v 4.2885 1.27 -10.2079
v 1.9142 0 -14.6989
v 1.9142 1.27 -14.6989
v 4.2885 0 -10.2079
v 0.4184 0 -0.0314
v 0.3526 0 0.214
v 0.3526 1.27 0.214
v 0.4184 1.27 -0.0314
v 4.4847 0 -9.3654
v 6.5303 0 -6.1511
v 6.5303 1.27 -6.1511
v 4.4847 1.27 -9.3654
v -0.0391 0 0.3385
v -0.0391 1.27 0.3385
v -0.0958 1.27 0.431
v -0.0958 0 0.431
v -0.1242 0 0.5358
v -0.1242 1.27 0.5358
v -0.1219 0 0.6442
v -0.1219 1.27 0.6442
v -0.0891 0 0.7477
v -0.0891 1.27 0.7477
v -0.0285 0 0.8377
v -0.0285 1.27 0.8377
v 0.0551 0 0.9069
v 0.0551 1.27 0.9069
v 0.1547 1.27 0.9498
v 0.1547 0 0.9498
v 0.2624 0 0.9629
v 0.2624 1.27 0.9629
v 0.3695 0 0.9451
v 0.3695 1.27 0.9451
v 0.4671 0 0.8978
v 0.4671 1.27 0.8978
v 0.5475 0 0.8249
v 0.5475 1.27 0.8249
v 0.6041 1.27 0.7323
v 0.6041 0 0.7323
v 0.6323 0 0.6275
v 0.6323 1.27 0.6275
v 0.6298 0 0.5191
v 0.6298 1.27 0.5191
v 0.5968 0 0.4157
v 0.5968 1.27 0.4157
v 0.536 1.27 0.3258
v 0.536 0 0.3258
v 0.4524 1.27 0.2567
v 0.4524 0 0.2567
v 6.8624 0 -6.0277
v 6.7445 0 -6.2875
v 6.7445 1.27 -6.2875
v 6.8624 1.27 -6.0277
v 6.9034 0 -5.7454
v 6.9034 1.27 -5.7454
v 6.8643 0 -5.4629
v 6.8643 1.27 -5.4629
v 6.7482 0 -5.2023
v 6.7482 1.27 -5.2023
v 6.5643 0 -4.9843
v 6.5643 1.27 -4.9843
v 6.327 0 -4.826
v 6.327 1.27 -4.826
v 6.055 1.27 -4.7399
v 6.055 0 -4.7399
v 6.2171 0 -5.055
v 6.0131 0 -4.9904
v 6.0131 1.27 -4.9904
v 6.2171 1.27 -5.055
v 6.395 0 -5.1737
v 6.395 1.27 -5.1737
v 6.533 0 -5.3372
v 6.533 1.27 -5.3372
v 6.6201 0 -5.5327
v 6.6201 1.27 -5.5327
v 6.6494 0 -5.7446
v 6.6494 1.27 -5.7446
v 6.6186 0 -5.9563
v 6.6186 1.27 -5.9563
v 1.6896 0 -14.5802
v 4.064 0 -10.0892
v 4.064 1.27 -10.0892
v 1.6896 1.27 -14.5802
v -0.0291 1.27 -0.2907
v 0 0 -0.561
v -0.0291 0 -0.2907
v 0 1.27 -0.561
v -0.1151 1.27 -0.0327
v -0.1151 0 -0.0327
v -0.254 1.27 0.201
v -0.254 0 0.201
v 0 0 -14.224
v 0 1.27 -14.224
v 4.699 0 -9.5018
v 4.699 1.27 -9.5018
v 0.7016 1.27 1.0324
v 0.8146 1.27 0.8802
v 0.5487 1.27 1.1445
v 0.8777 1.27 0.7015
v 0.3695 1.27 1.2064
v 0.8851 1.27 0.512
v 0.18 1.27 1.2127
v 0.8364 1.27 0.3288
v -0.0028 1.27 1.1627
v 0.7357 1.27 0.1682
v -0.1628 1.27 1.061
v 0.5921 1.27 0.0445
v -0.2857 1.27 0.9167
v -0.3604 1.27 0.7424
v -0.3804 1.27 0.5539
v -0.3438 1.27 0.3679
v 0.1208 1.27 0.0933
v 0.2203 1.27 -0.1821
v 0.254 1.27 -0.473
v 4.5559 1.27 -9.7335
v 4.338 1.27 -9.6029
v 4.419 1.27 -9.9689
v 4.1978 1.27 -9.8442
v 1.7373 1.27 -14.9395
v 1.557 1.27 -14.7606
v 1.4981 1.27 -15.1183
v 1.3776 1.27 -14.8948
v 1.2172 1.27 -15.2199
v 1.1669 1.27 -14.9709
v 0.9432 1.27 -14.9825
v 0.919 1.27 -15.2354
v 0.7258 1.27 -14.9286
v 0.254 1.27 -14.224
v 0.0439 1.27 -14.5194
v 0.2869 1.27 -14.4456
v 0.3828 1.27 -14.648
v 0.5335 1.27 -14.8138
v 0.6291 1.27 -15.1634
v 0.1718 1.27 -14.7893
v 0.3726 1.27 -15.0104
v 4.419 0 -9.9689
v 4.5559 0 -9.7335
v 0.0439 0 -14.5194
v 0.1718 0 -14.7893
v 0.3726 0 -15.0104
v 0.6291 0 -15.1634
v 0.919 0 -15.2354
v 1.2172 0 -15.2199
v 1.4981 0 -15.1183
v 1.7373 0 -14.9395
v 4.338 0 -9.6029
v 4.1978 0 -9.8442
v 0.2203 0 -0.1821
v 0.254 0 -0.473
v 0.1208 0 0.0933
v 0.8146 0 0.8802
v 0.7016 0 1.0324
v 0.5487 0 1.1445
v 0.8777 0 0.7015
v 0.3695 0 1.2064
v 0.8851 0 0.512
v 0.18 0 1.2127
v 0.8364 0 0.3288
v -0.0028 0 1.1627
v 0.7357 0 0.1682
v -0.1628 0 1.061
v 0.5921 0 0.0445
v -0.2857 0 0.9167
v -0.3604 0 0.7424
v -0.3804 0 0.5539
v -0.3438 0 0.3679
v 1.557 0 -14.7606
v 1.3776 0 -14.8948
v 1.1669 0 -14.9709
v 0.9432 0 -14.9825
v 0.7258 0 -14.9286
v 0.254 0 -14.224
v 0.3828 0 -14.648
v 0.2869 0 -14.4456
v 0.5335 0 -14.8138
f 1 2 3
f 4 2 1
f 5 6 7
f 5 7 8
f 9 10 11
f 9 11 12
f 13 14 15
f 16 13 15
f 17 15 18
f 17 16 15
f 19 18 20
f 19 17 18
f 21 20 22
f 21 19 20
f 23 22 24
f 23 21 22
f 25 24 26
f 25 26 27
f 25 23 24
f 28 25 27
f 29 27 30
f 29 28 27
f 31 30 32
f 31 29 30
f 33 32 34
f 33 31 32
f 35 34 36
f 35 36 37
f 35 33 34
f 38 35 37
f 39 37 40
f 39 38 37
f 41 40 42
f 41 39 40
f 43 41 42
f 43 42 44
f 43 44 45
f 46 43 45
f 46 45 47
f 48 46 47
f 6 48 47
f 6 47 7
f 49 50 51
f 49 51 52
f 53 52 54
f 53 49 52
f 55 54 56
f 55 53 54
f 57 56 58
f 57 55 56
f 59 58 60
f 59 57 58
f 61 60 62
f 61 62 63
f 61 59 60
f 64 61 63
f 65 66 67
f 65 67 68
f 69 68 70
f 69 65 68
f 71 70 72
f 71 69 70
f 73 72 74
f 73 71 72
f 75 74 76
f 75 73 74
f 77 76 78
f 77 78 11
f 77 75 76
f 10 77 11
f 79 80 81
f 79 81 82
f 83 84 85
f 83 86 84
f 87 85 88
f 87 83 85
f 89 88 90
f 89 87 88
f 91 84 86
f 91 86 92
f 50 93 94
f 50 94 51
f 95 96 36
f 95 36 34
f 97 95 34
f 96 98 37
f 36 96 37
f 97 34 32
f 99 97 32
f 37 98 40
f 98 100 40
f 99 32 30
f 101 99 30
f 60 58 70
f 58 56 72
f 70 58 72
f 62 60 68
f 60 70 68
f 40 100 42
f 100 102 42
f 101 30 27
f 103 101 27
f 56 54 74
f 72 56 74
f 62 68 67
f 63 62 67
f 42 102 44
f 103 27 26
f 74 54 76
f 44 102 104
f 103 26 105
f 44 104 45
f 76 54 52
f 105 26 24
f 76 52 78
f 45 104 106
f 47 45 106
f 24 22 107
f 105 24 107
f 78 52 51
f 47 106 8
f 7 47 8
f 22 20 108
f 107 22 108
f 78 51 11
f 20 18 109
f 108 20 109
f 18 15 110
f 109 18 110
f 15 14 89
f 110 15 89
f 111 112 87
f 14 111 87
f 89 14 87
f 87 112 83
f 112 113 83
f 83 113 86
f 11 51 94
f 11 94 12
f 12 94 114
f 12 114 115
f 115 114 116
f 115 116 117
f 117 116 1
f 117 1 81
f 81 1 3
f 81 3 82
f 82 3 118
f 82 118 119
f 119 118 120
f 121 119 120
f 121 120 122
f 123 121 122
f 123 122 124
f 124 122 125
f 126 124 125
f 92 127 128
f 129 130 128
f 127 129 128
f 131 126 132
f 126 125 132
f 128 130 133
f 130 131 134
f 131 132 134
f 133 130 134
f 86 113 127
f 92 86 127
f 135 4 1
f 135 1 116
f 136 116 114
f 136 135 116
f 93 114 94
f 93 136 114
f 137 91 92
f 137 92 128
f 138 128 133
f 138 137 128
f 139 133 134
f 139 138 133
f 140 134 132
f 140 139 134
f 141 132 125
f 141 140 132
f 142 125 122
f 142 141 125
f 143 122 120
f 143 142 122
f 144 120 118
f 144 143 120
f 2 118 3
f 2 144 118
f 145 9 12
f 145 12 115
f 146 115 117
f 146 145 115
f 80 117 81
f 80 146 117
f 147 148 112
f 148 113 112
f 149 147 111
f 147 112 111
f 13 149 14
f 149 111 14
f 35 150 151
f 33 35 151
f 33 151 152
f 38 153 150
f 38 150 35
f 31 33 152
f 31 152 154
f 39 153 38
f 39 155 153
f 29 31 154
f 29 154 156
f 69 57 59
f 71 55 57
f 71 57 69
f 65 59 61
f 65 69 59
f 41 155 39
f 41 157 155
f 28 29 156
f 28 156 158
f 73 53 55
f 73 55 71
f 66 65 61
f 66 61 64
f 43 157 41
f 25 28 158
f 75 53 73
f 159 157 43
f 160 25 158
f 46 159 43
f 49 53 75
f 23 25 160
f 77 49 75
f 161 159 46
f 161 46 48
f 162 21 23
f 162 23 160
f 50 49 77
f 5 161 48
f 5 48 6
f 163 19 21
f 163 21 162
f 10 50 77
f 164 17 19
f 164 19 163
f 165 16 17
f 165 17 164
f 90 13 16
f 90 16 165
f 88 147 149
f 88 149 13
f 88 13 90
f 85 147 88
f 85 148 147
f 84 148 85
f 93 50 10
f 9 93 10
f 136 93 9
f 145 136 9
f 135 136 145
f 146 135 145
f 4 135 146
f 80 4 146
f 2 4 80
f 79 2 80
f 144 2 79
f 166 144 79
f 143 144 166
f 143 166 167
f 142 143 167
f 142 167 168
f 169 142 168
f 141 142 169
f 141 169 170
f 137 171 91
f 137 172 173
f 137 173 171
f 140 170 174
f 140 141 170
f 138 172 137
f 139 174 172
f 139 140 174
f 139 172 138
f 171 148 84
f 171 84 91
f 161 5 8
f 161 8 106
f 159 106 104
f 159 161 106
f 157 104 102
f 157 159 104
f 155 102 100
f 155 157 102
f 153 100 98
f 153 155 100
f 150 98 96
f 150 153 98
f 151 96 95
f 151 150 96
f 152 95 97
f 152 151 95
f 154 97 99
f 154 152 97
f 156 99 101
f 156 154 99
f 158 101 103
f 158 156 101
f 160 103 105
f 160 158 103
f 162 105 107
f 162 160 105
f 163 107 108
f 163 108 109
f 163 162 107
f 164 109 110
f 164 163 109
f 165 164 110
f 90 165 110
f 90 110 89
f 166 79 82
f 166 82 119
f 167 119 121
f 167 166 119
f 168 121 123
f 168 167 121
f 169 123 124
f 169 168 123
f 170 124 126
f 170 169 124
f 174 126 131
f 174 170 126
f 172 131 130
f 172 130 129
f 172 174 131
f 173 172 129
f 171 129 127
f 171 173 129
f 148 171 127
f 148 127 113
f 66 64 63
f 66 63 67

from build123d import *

# Parameters (mm, degrees)
BOSS_EXTRUDE1_DEPTH = 1.27
FILLET1_R           = 1.27


with BuildPart() as part:
    # Sketch1 → Boss-Extrude1 (new body)
    with BuildSketch(Plane(origin=(0, 0, 0), x_dir=(1, 0, 0), z_dir=(0, 1, 0))):
        with BuildLine():
            Line((0, 0), (0, 14.224))
            ThreePointArc((0, 14.224), (0.77136744, 15.210108975), (1.914194705, 14.698870794))
            Line((1.914194705, 14.698870794), (4.288548676, 10.207897267))
            ThreePointArc((4.288548676, 10.207897267), (4.486671136, 9.850723748), (4.698989351, 9.501801969))
            Line((4.698989351, 9.501801969), (6.744540566, 6.287487077))
            ThreePointArc((6.744540566, 6.287487077), (6.815438139, 5.328506429), (6.055012218, 4.739929527))
            Line((6.055012218, 4.739929527), (6.013106646, 4.990448833))
            ThreePointArc((6.013106646, 4.990448833), (6.583426086, 5.43188151), (6.530252906, 6.151116996))
            Line((6.530252906, 6.151116996), (4.484701691, 9.365431888))
            ThreePointArc((4.484701691, 9.365431888), (4.267075521, 9.723076711), (4.064, 10.089179569))
            Line((4.064, 10.089179569), (1.689646029, 14.580153096))
            ThreePointArc((1.689646029, 14.580153096), (0.83252558, 14.963581731), (0.254, 14.224))
            Line((0.254, 14.224), (0.254, -0.200987113))
            ThreePointArc((0.254, -0.200987113), (0.204269521, -0.959727605), (0.352610056, -0.213969373))
            Line((0.352610056, -0.213969373), (0.418350094, 0.031375786))
            ThreePointArc((0.418350094, 0.031375786), (0.301490909, -1.215208728), (0, 0))
        make_face()
    extrude(amount=BOSS_EXTRUDE1_DEPTH)

    # Fillet1
    fillet1_edges = [part.edges().sort_by_distance(p)[0] for p in [
        (0.254, 0.635, 0.200987113),
        (0, 0.635, 0),
    ]]
    fillet(fillet1_edges, radius=FILLET1_R)


solid = part.part
